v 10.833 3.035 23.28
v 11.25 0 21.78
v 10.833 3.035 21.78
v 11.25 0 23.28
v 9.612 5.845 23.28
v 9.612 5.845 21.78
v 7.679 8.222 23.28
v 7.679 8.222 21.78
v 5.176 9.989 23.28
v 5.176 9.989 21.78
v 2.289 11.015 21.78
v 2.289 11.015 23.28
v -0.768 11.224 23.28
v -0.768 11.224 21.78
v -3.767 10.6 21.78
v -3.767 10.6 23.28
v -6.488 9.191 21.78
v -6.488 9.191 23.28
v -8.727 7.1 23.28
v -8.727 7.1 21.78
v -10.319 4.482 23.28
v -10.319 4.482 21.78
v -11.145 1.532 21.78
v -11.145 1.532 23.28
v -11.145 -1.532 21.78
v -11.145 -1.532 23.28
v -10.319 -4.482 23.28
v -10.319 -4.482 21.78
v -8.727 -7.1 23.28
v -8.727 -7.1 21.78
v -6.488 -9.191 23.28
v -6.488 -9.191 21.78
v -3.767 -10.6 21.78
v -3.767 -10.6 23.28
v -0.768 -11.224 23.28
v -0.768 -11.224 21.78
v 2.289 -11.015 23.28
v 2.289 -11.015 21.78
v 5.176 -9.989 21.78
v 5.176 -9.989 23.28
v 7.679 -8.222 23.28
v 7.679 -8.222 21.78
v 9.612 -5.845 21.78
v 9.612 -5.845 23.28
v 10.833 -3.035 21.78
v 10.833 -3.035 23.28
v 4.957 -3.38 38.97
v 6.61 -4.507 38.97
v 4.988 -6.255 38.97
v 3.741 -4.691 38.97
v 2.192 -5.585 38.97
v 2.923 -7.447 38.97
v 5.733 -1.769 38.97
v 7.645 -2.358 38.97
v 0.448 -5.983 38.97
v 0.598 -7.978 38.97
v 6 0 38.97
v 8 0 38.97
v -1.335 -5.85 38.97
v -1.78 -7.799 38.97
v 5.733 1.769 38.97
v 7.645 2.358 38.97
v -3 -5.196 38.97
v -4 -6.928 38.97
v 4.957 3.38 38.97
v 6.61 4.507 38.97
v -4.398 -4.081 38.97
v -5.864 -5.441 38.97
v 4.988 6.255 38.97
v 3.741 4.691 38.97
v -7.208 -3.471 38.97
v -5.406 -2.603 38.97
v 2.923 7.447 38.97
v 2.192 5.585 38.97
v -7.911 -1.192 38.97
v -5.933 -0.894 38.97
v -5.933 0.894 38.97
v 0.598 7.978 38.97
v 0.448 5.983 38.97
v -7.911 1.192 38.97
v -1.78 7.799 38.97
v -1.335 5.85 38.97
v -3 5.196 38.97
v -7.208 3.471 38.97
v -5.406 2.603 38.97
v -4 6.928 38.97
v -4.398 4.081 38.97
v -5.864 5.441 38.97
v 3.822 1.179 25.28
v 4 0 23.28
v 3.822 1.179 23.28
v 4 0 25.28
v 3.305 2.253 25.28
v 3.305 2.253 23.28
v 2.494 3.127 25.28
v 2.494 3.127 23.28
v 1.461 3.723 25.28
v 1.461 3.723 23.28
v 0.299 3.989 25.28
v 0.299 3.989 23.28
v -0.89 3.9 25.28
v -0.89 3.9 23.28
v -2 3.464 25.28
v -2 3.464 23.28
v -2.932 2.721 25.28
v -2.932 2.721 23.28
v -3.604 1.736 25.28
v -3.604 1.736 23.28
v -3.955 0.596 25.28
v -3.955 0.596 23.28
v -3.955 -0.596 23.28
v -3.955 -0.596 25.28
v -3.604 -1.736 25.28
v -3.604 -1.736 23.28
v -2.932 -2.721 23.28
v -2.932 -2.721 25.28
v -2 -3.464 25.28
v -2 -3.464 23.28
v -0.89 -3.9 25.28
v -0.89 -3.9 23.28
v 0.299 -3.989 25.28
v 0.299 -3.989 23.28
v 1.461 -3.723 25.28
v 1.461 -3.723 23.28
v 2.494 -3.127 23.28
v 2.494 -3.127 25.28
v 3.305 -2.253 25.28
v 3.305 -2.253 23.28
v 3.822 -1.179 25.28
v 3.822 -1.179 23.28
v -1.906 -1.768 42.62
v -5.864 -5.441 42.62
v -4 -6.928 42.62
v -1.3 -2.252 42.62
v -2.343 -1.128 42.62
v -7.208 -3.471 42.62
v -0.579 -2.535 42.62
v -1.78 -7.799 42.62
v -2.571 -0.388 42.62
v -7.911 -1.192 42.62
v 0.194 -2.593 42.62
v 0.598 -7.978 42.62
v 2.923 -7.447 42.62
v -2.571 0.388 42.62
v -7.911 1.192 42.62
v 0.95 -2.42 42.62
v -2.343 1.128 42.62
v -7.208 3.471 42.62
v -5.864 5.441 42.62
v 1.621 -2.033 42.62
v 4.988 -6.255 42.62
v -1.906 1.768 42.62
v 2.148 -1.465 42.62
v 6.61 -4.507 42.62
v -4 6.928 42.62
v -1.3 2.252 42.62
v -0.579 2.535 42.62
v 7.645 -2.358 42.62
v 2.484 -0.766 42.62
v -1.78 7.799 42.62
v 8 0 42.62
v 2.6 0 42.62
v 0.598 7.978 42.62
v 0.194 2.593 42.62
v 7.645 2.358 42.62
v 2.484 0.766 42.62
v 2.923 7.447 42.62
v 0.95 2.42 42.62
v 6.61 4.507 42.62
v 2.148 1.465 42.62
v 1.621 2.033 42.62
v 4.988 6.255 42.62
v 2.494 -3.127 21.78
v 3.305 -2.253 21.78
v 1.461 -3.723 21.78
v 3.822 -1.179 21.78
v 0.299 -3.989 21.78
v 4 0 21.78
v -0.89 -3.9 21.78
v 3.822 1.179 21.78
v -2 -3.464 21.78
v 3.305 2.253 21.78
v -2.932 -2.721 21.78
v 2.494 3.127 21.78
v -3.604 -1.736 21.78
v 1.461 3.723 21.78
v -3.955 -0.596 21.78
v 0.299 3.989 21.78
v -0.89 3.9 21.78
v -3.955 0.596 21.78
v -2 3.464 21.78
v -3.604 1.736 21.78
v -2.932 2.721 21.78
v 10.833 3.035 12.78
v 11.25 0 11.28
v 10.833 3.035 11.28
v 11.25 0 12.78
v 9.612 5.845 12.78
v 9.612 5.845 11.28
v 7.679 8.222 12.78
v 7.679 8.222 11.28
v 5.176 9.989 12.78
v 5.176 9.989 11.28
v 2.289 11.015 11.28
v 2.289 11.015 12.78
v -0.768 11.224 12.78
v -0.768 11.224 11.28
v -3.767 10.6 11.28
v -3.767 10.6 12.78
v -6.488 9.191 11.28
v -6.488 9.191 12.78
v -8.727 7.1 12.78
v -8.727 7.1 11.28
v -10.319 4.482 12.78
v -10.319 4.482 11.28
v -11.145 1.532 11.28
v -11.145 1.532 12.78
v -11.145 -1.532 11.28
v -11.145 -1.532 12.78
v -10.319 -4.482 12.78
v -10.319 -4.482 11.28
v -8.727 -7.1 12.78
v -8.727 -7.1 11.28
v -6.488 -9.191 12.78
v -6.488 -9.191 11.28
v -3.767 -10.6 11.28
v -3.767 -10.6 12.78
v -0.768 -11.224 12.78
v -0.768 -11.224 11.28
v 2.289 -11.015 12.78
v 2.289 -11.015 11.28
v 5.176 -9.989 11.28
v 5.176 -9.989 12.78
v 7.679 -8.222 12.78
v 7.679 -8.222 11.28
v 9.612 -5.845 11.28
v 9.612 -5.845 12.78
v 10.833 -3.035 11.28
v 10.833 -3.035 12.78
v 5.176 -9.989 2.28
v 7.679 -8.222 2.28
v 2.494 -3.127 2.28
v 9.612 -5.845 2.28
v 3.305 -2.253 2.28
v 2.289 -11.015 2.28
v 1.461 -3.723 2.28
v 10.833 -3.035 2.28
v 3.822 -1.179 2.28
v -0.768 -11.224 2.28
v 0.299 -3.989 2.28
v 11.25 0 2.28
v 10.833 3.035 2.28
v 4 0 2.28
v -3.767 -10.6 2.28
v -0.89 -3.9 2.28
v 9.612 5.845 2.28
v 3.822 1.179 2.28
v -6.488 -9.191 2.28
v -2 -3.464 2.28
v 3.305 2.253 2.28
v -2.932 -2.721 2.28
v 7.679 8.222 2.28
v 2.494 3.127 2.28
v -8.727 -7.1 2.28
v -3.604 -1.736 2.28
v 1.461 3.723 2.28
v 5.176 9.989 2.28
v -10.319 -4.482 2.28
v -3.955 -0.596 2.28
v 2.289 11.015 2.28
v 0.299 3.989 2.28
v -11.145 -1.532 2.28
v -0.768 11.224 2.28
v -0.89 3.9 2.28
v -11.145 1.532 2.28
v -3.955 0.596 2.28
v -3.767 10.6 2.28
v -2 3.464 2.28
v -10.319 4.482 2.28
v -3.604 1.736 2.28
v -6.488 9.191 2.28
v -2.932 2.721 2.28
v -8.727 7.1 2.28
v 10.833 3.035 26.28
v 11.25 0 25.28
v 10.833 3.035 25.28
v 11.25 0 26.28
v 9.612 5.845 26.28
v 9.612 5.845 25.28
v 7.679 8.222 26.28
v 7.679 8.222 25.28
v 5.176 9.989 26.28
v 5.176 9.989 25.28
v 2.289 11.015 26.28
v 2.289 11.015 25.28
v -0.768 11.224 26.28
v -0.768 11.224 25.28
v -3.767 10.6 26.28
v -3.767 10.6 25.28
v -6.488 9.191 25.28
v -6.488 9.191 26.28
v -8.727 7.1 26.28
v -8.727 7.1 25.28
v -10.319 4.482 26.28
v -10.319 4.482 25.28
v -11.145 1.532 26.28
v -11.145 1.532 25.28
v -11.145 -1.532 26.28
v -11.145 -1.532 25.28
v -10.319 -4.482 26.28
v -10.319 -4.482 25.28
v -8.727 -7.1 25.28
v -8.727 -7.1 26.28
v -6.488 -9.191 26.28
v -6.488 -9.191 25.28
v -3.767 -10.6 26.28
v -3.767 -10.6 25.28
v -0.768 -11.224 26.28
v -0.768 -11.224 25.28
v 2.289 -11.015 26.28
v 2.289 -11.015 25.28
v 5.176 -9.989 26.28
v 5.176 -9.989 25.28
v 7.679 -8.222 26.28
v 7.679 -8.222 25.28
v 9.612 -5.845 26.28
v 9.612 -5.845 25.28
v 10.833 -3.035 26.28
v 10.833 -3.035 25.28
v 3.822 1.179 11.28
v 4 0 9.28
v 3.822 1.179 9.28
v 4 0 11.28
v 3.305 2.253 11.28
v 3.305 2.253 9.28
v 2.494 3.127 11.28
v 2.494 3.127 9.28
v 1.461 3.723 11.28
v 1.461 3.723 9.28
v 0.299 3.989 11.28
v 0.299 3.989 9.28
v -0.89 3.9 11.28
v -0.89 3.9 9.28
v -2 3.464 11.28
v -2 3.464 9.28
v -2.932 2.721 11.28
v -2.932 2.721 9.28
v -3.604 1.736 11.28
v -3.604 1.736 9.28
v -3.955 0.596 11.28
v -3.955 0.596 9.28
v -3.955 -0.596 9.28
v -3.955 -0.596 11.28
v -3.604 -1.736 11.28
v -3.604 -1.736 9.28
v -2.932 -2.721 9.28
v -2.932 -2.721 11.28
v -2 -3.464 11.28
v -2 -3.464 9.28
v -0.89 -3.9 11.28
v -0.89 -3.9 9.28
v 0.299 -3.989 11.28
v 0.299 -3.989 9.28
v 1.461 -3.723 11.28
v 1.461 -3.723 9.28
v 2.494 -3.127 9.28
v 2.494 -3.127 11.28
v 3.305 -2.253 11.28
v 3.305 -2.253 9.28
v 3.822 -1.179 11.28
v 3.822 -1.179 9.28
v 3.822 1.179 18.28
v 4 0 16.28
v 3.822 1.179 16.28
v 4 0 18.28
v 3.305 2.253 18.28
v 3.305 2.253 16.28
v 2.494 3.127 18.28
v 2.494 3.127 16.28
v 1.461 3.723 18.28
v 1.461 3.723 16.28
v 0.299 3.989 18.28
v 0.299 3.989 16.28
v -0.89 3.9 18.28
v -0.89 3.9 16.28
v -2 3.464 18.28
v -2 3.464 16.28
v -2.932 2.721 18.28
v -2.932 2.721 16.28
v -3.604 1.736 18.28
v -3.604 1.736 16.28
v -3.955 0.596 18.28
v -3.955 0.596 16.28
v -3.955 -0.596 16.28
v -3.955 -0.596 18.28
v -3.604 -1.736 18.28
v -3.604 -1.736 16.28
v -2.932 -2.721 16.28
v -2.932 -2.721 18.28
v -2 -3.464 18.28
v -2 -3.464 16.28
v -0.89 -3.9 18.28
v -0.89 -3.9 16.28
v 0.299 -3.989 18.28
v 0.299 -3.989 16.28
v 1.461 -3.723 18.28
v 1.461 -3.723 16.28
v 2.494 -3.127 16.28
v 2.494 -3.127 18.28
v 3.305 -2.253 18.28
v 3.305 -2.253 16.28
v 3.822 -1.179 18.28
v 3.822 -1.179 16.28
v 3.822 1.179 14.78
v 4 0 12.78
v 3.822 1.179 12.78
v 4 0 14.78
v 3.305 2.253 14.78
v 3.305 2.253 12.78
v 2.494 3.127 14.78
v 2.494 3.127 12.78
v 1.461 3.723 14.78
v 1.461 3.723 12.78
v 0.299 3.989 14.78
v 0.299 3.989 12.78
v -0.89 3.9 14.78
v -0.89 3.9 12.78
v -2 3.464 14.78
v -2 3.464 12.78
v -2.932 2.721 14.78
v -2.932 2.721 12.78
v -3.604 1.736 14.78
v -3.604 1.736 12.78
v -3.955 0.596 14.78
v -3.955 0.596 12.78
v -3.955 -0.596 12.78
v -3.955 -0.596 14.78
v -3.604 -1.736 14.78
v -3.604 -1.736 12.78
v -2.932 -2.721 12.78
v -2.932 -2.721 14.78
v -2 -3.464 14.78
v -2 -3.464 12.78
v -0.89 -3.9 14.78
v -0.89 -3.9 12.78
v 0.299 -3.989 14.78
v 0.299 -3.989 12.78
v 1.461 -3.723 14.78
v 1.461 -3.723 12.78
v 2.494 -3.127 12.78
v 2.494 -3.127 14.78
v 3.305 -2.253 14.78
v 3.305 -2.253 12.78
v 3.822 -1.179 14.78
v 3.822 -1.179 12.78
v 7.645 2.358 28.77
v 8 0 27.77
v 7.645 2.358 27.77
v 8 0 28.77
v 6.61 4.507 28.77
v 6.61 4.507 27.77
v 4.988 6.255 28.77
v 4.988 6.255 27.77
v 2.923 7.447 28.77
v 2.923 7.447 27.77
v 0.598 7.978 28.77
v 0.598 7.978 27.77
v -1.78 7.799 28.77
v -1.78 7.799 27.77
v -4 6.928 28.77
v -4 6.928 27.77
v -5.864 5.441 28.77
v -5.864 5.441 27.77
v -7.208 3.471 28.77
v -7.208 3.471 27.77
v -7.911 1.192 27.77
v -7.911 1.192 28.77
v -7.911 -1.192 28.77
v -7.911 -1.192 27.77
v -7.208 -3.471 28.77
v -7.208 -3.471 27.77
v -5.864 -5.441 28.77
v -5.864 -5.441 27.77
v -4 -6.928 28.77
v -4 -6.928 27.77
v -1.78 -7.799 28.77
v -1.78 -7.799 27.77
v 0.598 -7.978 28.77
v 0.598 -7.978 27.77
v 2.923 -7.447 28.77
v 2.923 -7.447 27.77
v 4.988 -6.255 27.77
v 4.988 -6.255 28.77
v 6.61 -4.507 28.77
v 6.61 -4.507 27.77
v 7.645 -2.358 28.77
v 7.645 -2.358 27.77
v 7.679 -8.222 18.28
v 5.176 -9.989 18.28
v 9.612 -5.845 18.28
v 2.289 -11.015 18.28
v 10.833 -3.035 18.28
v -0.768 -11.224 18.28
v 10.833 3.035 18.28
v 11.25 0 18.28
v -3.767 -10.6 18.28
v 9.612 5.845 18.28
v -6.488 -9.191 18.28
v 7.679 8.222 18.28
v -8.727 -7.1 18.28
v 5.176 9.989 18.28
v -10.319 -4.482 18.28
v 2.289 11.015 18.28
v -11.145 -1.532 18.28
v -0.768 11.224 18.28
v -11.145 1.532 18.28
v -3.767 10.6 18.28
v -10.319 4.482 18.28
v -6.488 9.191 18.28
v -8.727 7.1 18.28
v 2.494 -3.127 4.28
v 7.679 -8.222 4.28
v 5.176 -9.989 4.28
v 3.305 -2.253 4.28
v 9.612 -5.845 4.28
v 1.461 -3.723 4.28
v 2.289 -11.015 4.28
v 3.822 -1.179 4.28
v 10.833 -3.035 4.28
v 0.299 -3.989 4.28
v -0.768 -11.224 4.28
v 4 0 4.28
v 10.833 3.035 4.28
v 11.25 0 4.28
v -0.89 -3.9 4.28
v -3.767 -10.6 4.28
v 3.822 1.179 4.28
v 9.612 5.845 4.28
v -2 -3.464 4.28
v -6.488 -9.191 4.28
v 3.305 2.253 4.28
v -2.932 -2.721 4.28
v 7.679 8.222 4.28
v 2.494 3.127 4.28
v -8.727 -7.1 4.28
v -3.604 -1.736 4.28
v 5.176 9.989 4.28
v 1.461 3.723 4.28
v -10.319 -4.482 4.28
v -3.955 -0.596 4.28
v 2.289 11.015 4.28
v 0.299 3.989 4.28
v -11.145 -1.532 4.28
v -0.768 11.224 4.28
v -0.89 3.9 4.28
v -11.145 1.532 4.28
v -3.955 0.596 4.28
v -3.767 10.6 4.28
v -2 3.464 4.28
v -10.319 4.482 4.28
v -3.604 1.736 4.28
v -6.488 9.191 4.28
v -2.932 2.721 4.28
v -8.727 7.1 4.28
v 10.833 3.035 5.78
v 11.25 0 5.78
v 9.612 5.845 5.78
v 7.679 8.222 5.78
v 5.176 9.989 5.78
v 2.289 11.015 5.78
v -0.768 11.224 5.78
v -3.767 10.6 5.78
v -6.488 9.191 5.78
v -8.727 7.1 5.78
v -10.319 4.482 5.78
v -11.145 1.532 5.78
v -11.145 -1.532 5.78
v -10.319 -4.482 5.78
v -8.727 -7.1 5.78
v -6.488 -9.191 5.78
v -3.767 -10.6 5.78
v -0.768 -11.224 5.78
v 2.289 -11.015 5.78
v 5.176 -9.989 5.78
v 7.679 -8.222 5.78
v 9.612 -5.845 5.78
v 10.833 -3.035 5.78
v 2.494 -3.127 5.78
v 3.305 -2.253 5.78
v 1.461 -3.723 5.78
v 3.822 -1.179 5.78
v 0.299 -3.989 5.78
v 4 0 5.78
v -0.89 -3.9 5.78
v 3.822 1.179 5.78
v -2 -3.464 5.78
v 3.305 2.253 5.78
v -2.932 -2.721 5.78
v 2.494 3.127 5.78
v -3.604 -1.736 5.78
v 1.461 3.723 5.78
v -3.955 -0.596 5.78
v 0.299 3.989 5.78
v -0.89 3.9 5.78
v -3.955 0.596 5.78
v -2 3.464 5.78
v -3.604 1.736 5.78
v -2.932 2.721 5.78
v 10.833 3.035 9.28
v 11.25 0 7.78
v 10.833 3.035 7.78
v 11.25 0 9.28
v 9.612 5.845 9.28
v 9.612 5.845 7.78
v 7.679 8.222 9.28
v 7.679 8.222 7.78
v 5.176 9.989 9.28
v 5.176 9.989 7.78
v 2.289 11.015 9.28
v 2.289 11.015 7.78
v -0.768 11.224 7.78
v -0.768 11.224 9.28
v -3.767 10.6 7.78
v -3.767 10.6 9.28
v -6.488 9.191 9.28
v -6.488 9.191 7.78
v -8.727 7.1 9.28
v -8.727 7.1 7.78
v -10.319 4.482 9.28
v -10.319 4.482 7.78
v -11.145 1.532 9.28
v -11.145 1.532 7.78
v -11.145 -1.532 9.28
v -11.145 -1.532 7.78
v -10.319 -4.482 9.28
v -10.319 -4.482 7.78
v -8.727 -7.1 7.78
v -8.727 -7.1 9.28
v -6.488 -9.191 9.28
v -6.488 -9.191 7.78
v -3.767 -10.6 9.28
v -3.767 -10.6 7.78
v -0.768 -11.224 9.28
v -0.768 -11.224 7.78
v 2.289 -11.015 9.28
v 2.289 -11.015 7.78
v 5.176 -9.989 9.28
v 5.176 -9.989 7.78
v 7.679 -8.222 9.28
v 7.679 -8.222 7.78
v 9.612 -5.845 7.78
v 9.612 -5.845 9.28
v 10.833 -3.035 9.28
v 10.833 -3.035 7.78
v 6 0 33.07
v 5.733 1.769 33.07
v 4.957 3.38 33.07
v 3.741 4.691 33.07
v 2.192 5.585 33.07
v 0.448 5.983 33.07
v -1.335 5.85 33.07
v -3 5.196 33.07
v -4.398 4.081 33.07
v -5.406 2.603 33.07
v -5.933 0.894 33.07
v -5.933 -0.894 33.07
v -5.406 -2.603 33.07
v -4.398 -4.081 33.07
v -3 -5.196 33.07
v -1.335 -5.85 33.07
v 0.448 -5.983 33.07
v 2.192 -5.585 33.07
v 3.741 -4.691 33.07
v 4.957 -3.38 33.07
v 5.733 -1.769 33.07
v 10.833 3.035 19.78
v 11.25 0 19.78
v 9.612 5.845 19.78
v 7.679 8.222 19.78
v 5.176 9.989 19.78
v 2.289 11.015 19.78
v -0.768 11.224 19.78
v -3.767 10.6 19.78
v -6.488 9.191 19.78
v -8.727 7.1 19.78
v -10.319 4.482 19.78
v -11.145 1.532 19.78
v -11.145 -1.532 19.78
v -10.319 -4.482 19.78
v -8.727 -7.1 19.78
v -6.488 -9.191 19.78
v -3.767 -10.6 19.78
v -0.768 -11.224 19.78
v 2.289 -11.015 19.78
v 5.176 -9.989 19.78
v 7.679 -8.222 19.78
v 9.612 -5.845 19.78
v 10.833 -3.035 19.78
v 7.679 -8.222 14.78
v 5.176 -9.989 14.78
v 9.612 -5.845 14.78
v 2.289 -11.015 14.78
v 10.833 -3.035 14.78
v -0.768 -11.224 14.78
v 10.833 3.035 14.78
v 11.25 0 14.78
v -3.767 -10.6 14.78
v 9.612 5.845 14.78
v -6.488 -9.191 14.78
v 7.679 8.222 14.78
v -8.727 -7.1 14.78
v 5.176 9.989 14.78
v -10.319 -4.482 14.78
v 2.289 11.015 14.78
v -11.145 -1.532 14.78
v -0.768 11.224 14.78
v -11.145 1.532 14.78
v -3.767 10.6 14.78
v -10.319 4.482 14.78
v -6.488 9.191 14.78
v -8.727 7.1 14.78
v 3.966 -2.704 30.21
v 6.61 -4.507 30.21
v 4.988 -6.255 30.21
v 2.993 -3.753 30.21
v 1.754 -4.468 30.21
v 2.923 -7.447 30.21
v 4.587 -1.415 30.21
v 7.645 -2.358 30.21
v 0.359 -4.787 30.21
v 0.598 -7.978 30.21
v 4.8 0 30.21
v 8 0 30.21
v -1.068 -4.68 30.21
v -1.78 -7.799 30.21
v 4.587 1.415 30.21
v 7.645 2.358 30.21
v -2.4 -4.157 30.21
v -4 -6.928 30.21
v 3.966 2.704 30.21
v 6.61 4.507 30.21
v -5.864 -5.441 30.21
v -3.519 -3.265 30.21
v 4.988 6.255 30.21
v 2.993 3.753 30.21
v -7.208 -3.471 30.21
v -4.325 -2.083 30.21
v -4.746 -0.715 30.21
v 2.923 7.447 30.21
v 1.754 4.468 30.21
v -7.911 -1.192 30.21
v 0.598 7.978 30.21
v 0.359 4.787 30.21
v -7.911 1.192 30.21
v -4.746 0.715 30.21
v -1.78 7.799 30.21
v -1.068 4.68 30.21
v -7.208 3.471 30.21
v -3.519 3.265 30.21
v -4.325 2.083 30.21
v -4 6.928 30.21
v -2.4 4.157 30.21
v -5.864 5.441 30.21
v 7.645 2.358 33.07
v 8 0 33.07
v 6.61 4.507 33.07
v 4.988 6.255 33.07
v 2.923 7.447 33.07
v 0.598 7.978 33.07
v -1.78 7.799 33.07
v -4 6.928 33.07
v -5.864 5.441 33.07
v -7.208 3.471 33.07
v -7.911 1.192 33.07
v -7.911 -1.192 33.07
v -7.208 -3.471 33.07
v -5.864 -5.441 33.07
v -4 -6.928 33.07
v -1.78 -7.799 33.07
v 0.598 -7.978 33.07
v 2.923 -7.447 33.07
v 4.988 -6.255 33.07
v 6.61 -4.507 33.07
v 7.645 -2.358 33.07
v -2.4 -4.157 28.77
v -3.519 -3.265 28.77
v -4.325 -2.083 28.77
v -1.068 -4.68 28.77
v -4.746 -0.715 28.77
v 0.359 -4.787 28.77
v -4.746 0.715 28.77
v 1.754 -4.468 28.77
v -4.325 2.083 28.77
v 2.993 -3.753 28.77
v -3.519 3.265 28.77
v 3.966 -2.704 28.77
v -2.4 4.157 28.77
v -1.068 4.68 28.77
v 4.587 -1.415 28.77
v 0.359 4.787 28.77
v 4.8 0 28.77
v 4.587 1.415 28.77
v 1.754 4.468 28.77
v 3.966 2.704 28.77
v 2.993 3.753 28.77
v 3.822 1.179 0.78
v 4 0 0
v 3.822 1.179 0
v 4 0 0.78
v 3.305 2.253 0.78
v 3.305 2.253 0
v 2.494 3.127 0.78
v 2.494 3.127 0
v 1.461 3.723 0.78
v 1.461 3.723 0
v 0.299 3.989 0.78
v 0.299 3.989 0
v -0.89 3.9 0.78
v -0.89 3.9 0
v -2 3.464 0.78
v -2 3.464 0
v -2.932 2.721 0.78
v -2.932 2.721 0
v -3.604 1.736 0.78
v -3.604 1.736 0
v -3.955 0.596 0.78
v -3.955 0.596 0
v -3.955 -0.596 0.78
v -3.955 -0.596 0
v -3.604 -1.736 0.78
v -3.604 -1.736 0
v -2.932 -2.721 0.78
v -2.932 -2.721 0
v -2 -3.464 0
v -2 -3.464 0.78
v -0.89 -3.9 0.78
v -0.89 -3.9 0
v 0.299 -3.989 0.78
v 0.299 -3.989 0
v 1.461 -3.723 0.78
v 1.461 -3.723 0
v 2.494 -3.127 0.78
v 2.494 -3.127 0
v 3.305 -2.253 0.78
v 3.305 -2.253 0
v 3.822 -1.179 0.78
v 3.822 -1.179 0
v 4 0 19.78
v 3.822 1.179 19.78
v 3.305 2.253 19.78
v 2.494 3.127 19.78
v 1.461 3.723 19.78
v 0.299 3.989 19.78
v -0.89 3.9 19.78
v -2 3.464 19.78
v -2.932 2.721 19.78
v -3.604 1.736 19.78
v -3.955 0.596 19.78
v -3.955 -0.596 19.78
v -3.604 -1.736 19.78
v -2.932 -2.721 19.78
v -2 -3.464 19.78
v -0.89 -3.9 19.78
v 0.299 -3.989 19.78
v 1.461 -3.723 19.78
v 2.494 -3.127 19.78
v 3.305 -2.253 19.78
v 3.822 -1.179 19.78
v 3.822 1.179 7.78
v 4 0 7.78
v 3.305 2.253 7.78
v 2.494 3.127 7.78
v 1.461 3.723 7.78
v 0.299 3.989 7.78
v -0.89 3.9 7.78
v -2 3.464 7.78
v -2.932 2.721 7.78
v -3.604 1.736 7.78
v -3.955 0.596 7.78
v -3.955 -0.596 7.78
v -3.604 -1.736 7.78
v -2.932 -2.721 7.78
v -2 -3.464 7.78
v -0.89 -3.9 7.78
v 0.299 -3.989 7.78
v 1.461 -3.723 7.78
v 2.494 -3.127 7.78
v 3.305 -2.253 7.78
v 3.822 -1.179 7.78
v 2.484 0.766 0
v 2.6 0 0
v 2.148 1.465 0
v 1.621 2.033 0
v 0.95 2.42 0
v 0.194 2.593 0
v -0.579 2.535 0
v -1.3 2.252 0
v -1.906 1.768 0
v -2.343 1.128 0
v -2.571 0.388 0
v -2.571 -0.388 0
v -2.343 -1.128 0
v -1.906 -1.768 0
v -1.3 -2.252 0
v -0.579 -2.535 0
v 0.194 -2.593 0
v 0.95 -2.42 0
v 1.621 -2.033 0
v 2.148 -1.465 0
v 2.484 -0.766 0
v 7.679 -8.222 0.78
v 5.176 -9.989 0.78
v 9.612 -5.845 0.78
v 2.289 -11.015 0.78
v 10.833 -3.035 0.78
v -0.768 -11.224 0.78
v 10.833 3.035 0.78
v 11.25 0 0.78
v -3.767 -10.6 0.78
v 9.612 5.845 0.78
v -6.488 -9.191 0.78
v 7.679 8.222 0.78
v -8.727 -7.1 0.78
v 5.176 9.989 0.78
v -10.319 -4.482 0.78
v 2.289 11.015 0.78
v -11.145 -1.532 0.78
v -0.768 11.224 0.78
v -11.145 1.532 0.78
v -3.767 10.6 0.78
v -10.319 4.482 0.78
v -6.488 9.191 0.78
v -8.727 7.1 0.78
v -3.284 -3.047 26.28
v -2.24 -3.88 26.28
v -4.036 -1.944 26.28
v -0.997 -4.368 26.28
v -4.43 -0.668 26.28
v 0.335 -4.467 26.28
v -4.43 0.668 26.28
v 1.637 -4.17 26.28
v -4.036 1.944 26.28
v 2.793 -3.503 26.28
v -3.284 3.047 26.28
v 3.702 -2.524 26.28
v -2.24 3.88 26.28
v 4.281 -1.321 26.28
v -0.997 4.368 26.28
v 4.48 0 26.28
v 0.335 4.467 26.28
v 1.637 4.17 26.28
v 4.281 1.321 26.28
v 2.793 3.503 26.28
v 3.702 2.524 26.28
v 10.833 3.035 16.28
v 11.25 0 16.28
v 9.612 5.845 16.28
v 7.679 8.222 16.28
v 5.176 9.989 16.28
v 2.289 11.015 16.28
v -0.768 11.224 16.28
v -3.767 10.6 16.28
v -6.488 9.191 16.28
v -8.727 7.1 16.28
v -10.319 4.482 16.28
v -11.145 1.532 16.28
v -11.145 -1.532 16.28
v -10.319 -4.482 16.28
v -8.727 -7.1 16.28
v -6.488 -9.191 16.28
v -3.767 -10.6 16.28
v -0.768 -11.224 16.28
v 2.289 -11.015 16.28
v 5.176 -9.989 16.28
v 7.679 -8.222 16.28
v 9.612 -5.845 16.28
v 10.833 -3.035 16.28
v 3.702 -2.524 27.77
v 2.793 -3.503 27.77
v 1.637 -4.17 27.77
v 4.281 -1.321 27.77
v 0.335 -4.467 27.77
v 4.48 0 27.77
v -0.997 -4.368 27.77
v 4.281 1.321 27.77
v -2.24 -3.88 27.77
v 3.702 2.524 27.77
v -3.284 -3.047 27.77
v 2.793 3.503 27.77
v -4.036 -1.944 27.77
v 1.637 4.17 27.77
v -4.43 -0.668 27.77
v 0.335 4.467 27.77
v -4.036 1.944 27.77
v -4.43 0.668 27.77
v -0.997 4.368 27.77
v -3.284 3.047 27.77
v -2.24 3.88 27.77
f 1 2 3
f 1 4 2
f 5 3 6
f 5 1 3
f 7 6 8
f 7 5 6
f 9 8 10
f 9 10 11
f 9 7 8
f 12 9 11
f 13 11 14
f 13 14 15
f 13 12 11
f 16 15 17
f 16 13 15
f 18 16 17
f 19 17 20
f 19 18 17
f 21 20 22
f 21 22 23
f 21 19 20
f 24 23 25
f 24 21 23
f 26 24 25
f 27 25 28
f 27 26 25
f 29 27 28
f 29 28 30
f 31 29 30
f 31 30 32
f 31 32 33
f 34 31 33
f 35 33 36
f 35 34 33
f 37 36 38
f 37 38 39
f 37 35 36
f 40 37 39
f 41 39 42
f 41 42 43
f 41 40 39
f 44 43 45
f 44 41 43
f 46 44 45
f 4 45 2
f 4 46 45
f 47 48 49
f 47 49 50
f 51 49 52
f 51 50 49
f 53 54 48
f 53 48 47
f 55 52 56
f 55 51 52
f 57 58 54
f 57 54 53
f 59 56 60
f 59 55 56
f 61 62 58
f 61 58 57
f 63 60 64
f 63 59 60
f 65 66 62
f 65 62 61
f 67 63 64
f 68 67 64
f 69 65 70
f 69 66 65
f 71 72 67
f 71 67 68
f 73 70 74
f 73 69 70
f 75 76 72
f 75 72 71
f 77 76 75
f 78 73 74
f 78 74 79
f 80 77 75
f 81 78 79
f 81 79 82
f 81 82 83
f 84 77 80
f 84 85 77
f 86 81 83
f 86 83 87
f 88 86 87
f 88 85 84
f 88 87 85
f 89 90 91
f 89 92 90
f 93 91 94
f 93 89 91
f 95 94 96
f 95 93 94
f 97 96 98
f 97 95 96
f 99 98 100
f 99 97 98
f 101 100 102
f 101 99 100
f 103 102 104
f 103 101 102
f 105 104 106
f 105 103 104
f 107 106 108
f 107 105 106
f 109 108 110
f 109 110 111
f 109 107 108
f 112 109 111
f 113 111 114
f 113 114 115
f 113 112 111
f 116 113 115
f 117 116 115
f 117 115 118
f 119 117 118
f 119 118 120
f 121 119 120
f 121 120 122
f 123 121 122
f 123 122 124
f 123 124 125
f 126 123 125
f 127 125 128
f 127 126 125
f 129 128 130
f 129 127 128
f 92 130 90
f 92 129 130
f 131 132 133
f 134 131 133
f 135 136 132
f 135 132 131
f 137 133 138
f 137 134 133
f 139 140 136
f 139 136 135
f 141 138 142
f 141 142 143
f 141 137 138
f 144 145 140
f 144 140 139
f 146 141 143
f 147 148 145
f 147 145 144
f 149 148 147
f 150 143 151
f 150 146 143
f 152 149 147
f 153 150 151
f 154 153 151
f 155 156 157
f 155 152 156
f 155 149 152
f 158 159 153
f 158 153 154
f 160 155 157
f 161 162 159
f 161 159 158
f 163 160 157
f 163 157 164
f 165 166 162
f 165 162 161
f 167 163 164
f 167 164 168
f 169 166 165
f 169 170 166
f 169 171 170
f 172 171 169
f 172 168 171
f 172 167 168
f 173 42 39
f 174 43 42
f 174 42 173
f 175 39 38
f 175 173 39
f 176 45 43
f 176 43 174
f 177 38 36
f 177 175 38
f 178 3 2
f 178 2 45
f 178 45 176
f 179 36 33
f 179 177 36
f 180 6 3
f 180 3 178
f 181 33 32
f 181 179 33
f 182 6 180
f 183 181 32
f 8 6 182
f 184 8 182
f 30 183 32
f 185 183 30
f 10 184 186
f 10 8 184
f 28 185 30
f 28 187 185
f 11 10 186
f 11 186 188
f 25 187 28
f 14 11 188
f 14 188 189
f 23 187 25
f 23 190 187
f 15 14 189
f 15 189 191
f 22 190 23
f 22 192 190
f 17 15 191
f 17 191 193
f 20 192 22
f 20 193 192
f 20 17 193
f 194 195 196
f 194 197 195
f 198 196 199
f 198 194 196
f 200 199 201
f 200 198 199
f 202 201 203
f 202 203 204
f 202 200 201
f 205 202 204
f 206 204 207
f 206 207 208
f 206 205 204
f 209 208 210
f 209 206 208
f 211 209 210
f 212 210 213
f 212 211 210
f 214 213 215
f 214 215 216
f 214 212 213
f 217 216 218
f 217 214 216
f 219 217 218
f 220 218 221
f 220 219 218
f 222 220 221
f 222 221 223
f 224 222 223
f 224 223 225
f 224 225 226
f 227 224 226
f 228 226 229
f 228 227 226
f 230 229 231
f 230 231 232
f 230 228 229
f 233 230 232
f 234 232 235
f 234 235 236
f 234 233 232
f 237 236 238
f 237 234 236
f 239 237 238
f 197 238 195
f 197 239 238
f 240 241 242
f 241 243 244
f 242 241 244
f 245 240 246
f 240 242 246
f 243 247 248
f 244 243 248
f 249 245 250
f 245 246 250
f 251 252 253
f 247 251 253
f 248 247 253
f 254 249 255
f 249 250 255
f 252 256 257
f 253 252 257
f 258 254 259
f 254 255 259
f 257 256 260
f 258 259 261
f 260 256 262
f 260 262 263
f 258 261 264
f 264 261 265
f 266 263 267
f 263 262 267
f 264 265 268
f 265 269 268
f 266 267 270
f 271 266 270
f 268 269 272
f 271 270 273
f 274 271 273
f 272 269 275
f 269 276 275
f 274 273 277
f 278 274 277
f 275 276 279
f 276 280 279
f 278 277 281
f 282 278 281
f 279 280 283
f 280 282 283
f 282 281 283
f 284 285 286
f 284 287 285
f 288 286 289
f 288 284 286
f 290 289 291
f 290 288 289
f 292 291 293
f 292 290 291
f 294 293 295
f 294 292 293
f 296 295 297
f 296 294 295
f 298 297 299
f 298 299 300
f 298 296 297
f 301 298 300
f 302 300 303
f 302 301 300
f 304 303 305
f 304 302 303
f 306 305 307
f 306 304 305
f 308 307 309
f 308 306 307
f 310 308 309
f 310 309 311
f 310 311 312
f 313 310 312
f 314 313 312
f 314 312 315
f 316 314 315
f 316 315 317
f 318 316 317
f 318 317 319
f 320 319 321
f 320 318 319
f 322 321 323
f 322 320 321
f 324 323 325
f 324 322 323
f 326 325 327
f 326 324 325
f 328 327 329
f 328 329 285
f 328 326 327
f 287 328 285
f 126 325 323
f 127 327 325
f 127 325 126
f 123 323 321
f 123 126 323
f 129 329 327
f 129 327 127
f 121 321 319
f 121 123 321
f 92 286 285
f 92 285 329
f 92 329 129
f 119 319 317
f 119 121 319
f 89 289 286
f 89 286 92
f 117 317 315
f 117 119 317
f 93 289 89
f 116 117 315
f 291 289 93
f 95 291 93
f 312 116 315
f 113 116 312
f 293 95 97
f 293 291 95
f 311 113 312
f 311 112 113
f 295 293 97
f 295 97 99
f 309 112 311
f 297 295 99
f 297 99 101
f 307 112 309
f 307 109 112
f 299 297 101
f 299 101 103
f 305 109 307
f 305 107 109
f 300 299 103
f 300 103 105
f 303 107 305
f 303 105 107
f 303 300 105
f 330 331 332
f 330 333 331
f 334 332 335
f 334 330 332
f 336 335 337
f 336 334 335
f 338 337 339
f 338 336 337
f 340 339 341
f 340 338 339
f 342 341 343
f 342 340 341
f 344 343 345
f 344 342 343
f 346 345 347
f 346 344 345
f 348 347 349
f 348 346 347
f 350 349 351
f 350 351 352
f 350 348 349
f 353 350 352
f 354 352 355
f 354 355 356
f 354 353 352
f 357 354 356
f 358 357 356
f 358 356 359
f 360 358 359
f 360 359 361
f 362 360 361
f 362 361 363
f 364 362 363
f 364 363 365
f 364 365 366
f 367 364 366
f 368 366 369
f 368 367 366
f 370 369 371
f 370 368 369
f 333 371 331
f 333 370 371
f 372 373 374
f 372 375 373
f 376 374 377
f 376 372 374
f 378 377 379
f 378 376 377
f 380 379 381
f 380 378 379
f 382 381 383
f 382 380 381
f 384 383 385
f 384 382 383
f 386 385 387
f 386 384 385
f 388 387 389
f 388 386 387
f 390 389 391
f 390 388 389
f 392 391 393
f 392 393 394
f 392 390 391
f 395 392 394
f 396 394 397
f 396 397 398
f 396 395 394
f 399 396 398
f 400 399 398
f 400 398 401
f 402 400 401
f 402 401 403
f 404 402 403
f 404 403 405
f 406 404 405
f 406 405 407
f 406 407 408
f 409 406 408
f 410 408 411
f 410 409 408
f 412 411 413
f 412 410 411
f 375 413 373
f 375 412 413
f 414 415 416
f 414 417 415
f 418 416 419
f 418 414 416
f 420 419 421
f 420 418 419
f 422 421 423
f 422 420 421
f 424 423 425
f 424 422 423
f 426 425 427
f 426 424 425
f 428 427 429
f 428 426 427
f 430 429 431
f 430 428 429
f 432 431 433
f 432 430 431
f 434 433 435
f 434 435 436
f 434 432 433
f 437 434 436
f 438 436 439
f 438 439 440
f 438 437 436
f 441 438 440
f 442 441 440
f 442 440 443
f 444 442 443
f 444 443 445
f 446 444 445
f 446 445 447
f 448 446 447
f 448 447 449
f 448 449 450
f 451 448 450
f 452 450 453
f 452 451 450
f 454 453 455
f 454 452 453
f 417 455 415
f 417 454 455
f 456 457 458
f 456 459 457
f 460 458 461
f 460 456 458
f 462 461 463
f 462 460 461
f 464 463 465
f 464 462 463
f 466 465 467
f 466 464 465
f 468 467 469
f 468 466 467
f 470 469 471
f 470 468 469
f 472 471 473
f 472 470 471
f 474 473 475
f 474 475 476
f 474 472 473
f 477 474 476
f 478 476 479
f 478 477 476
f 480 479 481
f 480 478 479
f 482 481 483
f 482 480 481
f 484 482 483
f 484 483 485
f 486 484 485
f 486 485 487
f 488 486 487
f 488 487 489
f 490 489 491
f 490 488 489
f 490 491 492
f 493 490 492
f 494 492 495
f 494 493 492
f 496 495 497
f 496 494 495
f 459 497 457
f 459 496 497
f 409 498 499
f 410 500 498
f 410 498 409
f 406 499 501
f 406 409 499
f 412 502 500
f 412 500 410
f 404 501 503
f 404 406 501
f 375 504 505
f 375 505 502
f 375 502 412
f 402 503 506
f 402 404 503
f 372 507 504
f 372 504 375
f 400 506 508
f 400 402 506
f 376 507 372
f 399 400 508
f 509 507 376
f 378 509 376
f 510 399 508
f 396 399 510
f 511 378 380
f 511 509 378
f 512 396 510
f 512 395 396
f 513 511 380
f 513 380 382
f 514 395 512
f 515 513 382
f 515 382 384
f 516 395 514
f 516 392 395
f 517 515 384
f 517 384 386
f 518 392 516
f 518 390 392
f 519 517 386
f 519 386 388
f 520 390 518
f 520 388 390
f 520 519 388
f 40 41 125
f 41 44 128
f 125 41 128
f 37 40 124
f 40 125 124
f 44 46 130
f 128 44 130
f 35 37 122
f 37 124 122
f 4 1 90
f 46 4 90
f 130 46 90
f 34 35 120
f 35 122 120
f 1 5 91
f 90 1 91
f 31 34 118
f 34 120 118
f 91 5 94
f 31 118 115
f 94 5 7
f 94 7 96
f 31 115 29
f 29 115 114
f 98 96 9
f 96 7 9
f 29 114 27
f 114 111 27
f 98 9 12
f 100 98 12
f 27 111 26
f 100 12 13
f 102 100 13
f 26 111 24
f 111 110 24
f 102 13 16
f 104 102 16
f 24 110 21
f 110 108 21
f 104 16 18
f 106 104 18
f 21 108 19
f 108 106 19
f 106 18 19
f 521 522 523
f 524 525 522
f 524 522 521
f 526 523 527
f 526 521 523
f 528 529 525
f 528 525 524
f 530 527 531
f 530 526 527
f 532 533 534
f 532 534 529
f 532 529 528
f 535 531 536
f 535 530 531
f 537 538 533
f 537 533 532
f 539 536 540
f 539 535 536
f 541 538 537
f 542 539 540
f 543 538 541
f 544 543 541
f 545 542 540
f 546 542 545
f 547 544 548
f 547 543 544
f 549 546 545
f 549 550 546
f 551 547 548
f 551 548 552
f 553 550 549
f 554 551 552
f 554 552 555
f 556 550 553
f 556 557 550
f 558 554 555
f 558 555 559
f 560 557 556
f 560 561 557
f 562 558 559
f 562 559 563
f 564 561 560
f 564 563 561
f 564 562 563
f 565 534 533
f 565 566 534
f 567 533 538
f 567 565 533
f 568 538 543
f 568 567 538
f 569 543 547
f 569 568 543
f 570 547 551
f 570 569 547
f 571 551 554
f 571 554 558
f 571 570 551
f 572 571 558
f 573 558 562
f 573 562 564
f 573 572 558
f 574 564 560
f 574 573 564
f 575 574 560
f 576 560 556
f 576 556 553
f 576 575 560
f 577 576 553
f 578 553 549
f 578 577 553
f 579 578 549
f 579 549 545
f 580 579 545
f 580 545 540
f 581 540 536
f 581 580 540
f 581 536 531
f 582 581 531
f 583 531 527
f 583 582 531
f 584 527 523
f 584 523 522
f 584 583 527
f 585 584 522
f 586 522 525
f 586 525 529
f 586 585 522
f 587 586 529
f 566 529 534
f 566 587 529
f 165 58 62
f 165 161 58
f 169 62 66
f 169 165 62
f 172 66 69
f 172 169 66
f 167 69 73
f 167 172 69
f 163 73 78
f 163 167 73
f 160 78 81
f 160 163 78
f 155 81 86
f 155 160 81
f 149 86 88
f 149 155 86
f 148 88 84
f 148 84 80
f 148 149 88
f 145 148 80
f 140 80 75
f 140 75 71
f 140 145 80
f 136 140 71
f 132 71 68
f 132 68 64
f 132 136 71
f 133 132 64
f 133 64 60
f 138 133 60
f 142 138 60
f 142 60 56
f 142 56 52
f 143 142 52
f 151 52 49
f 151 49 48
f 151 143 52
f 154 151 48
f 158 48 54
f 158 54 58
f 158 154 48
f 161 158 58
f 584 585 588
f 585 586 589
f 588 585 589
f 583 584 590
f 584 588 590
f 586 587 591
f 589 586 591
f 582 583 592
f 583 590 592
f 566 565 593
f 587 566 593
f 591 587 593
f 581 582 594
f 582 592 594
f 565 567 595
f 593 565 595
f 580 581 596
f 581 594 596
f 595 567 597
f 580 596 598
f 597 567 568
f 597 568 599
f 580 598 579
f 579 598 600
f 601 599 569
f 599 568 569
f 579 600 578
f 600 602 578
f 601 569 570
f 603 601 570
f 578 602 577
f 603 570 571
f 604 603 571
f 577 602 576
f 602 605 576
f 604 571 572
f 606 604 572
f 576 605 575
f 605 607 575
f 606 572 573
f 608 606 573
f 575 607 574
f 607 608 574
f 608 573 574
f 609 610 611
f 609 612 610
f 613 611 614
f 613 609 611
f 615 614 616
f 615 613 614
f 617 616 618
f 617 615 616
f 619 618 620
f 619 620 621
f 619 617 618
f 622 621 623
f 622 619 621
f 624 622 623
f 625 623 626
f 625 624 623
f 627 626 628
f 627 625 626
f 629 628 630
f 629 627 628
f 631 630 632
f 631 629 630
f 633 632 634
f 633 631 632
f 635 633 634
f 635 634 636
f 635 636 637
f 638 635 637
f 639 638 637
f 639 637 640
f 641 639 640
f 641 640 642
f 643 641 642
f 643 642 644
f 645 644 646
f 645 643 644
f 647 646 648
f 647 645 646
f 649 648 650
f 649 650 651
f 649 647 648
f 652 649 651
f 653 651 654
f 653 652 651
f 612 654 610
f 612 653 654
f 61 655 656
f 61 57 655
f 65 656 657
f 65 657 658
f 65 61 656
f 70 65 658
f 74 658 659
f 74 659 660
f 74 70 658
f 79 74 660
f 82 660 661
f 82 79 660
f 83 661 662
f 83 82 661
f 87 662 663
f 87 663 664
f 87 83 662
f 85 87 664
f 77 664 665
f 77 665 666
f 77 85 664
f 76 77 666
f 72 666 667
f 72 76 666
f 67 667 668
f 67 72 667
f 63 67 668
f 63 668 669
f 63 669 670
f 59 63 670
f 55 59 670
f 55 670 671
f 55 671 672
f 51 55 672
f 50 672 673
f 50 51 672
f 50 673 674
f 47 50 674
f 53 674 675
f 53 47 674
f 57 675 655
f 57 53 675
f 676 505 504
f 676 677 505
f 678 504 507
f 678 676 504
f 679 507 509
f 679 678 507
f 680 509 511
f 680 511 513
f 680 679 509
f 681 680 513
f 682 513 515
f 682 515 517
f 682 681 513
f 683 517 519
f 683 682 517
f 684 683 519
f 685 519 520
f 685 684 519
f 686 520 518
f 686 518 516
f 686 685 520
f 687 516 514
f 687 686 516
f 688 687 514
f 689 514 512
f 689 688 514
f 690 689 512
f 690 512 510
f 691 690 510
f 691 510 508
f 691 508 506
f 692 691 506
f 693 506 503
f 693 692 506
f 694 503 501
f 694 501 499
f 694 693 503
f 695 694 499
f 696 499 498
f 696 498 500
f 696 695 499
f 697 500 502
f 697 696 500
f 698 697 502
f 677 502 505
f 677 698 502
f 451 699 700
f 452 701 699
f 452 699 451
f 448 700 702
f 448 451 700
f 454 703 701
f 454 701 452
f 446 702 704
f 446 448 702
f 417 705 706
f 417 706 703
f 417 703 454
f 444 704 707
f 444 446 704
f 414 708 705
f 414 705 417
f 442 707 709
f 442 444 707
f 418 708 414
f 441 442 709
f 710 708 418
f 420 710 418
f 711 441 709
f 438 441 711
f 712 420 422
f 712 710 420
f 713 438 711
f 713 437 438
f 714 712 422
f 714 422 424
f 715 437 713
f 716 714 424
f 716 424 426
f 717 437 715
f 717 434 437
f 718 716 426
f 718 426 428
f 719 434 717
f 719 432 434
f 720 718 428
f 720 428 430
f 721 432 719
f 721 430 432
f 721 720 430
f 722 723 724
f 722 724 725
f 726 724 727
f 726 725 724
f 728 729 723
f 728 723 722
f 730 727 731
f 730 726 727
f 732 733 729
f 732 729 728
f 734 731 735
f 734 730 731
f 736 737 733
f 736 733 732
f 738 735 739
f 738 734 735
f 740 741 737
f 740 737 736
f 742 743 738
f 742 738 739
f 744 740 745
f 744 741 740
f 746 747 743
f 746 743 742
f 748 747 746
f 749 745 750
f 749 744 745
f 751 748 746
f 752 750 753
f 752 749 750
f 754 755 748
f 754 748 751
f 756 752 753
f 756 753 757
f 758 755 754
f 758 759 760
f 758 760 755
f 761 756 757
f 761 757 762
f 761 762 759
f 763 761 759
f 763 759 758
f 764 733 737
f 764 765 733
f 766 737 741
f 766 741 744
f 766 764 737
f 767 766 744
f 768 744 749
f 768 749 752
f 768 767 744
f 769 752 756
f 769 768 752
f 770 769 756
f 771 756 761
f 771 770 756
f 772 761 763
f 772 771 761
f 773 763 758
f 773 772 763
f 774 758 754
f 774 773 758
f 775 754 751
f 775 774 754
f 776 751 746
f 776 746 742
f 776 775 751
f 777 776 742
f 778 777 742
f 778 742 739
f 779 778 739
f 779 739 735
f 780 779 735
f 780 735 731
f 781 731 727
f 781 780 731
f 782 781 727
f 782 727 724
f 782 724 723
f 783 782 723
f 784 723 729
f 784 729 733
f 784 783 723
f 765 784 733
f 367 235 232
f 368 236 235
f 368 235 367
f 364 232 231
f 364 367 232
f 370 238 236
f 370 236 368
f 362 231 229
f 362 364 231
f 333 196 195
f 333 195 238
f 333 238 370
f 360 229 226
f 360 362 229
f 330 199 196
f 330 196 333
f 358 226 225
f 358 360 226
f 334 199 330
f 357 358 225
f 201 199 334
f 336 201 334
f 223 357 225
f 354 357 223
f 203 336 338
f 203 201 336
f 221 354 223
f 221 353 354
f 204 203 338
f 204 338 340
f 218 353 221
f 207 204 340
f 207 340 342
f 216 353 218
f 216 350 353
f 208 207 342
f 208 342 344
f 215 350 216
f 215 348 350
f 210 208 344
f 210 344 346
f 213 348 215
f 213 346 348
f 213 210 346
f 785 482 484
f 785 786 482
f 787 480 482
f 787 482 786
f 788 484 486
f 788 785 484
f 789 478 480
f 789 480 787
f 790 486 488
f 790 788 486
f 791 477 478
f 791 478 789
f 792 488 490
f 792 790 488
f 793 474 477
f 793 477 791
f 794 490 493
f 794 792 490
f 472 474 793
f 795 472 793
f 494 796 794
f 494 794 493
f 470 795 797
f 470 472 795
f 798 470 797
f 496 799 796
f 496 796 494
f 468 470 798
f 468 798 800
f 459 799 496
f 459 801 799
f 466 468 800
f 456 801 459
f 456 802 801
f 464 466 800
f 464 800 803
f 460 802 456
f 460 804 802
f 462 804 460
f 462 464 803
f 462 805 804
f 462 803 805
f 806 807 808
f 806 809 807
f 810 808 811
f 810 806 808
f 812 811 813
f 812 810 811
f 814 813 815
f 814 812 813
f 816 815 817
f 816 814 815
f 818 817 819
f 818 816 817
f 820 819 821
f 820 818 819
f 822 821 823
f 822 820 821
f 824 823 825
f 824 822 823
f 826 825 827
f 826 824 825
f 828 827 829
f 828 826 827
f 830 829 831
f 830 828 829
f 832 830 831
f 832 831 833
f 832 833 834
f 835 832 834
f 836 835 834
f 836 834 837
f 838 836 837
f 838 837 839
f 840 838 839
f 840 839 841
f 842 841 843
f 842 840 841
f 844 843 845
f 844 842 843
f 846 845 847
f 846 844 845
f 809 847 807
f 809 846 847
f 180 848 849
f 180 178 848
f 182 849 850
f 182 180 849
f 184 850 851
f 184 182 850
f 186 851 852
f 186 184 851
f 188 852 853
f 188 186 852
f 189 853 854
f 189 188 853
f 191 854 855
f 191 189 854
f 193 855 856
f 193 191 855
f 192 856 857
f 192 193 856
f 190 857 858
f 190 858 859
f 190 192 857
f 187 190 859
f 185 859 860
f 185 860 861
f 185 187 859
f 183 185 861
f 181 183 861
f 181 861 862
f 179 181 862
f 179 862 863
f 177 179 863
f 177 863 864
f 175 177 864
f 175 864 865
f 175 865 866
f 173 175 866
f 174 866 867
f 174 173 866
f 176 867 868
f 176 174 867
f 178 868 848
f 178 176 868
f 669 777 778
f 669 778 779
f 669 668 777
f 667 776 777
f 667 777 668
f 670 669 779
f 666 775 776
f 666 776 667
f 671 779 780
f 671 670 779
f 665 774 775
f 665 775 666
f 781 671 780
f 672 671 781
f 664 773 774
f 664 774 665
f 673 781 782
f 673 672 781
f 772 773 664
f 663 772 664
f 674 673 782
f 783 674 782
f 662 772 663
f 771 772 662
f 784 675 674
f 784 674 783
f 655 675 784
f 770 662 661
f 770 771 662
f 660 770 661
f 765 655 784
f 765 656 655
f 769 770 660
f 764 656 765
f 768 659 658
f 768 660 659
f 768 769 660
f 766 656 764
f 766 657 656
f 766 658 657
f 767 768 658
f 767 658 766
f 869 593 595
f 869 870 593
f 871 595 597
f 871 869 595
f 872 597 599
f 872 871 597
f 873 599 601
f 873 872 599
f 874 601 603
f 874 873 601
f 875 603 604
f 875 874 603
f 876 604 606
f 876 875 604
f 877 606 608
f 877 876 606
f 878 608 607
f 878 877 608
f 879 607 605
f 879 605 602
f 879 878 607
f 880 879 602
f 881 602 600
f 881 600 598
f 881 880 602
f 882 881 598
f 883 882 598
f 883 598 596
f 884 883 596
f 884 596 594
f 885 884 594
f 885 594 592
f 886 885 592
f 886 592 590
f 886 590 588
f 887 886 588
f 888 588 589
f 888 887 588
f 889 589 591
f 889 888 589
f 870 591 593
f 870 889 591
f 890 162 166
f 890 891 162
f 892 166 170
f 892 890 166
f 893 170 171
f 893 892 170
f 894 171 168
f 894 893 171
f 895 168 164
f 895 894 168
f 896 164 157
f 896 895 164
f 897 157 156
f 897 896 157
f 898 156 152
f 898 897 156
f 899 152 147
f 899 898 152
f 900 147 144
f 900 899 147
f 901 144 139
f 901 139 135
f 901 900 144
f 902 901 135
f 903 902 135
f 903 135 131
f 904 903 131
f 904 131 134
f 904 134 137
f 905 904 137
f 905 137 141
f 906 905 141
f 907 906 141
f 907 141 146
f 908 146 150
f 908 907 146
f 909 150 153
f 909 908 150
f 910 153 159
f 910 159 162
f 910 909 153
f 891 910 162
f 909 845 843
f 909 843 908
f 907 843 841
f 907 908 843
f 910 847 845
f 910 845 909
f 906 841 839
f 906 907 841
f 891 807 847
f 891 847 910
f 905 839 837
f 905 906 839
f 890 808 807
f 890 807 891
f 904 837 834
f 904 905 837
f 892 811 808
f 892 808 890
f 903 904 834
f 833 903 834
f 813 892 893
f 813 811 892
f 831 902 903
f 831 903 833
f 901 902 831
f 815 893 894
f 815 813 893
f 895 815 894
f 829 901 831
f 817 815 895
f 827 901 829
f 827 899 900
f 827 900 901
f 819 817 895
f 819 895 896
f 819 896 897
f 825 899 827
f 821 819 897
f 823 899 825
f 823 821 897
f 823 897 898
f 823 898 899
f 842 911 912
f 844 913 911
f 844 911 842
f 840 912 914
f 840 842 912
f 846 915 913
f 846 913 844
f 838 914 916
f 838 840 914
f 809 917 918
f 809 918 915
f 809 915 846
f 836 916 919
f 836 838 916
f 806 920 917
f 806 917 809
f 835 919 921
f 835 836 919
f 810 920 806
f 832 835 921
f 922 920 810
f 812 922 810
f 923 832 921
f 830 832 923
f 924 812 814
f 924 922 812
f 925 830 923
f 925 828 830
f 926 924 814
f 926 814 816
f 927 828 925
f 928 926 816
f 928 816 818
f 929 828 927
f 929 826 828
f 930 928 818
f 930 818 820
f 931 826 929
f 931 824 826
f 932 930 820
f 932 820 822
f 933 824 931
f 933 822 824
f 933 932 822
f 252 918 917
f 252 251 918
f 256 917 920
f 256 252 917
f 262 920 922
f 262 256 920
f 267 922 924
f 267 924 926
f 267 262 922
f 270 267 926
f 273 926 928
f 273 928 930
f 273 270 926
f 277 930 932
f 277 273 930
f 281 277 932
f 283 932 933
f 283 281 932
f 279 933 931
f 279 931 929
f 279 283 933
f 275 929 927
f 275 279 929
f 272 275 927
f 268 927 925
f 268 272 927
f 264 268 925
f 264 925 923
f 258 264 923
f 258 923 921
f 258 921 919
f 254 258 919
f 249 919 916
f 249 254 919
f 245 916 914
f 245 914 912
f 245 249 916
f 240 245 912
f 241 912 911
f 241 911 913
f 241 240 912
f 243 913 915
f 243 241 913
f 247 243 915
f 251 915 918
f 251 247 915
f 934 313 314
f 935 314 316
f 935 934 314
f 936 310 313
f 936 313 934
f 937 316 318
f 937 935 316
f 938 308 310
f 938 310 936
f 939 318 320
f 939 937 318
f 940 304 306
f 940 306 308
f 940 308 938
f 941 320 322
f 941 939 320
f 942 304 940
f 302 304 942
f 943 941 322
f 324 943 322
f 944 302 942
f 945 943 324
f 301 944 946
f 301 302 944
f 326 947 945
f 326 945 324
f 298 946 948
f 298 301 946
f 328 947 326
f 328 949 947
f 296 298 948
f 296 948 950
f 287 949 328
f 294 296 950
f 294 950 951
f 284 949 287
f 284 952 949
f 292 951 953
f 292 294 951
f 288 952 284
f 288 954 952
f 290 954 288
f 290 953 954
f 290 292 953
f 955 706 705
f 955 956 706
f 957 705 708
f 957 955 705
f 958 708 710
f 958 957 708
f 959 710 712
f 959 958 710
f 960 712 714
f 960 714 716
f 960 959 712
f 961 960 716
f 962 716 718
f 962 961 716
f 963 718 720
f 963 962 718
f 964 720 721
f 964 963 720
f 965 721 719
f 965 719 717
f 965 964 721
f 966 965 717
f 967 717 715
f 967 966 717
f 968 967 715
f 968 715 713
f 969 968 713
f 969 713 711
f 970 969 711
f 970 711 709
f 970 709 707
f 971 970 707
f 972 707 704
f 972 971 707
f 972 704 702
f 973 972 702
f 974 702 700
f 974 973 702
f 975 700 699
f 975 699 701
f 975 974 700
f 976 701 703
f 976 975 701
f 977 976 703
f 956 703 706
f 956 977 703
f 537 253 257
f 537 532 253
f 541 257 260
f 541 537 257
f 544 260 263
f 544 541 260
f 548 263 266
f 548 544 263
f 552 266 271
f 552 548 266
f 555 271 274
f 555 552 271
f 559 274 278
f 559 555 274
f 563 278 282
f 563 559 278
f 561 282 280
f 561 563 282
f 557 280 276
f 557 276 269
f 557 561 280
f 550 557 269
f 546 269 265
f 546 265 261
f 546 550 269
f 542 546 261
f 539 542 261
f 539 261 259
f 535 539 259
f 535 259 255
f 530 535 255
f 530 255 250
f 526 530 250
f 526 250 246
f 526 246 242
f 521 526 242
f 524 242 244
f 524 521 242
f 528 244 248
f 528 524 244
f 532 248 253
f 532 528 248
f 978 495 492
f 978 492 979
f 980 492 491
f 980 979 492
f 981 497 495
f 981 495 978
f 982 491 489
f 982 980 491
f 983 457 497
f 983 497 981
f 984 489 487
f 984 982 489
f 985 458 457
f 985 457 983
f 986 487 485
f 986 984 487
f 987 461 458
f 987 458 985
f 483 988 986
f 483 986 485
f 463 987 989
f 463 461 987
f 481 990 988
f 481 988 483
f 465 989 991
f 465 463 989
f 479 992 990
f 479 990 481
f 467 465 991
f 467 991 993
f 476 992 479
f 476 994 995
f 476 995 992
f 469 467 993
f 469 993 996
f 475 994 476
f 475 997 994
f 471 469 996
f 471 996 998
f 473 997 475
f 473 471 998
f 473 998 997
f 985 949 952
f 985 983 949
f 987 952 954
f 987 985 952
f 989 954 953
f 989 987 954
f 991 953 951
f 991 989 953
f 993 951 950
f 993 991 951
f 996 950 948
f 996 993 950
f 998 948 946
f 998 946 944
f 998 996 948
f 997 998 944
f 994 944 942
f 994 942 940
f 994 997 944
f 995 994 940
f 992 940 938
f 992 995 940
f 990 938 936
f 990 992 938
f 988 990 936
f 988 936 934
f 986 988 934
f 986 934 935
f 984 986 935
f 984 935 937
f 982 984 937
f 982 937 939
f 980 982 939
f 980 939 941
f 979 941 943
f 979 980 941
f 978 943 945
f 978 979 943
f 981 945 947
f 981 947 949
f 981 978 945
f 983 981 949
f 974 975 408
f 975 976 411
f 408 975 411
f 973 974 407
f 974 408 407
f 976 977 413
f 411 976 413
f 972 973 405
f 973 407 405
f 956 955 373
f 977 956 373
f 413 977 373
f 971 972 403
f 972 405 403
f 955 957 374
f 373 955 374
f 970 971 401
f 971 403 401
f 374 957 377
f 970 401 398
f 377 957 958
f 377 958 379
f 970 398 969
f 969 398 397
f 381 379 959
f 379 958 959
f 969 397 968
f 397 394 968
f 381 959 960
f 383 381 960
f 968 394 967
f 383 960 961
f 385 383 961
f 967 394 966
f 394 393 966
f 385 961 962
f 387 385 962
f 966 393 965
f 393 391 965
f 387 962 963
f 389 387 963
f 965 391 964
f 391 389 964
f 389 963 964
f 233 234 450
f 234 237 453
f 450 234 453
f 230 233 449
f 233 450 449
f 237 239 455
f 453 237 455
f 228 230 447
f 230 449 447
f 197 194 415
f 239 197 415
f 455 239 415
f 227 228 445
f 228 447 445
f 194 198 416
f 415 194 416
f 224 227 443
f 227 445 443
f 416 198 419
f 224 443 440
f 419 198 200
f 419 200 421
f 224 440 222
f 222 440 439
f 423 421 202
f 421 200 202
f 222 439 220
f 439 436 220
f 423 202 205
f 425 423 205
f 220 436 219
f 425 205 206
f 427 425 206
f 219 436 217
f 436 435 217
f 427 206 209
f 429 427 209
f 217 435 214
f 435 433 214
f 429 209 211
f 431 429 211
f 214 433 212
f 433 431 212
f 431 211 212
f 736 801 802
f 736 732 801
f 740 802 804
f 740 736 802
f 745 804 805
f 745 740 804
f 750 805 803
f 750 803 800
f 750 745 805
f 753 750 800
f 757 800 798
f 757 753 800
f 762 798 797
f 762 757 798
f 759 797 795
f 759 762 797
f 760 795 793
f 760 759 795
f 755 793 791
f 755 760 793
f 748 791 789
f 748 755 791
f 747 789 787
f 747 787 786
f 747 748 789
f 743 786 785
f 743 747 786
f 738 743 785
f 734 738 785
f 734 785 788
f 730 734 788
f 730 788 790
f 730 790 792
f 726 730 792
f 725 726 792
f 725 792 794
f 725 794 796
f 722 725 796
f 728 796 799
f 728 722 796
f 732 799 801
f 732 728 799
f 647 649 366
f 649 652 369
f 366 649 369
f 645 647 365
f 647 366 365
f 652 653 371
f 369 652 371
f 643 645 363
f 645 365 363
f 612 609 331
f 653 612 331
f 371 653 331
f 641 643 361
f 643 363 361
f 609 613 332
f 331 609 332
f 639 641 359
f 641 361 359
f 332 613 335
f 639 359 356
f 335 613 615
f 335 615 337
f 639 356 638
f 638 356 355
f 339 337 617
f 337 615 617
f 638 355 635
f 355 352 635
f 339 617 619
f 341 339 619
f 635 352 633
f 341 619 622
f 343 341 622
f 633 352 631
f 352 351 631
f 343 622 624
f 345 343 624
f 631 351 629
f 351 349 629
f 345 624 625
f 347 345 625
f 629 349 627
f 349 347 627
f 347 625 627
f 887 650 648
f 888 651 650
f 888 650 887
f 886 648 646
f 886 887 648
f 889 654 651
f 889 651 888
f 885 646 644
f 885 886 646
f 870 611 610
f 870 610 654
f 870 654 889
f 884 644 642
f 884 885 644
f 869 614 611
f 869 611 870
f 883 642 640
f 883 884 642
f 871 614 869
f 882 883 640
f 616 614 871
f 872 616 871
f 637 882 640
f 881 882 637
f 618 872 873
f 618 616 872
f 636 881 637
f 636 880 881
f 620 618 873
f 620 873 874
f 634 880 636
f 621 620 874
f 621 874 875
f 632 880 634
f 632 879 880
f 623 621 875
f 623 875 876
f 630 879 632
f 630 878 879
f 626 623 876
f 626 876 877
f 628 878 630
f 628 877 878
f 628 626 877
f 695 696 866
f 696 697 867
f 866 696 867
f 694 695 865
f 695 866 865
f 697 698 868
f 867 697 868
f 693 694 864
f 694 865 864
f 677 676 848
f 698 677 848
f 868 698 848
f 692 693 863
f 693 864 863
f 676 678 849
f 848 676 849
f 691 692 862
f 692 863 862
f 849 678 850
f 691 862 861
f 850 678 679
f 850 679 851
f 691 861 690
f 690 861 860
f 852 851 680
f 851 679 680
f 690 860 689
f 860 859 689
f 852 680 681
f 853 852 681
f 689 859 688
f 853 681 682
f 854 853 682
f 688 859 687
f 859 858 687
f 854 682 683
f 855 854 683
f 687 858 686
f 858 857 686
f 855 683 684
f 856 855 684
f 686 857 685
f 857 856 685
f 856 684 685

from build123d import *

# Parameters (mm, degrees)
F2_W = 11.213089
F2_H = 2


with BuildPart() as f1:
    # F0 (on Front) → F1 (revolve)
    with BuildSketch(Plane.XZ):
        Polygon((2.6, 42.62), (2.6, 0), (11.25, 0), (11.25, 26.28), (4.48, 26.28), (4.48, 27.77), (8, 27.77), (8, 28.77), (4.8, 28.77), (4.8, 30.21), (8, 30.21), (8, 33.07), (6, 33.07), (6, 38.97), (8, 38.97), (8, 42.62), align=None)
    revolve(axis=Axis((0, 0, 5.449006), (0, 0, 1)))

    # F2 (on Front) → F3 (revolve, cut)
    with BuildSketch(Plane.XZ):
        with Locations((9.606545, -3.72)):
            Rectangle(F2_W, F2_H)
        with Locations((9.606545, -0.22)):
            Rectangle(F2_W, F2_H)
        with Locations((9.606545, 3.28)):
            Rectangle(F2_W, F2_H)
        with Locations((9.606545, 6.78)):
            Rectangle(F2_W, F2_H)
        with Locations((9.606545, 10.28)):
            Rectangle(F2_W, F2_H)
        with Locations((9.606545, 13.78)):
            Rectangle(F2_W, F2_H)
        with Locations((9.606545, 17.28)):
            Rectangle(F2_W, F2_H)
        with Locations((9.606545, 20.78)):
            Rectangle(F2_W, F2_H)
        with Locations((9.606545, 24.28)):
            Rectangle(F2_W, F2_H)
    revolve(axis=Axis((0, 0, 3.329653), (0, 0, 1)), mode=Mode.SUBTRACT)


solid = f1.part
